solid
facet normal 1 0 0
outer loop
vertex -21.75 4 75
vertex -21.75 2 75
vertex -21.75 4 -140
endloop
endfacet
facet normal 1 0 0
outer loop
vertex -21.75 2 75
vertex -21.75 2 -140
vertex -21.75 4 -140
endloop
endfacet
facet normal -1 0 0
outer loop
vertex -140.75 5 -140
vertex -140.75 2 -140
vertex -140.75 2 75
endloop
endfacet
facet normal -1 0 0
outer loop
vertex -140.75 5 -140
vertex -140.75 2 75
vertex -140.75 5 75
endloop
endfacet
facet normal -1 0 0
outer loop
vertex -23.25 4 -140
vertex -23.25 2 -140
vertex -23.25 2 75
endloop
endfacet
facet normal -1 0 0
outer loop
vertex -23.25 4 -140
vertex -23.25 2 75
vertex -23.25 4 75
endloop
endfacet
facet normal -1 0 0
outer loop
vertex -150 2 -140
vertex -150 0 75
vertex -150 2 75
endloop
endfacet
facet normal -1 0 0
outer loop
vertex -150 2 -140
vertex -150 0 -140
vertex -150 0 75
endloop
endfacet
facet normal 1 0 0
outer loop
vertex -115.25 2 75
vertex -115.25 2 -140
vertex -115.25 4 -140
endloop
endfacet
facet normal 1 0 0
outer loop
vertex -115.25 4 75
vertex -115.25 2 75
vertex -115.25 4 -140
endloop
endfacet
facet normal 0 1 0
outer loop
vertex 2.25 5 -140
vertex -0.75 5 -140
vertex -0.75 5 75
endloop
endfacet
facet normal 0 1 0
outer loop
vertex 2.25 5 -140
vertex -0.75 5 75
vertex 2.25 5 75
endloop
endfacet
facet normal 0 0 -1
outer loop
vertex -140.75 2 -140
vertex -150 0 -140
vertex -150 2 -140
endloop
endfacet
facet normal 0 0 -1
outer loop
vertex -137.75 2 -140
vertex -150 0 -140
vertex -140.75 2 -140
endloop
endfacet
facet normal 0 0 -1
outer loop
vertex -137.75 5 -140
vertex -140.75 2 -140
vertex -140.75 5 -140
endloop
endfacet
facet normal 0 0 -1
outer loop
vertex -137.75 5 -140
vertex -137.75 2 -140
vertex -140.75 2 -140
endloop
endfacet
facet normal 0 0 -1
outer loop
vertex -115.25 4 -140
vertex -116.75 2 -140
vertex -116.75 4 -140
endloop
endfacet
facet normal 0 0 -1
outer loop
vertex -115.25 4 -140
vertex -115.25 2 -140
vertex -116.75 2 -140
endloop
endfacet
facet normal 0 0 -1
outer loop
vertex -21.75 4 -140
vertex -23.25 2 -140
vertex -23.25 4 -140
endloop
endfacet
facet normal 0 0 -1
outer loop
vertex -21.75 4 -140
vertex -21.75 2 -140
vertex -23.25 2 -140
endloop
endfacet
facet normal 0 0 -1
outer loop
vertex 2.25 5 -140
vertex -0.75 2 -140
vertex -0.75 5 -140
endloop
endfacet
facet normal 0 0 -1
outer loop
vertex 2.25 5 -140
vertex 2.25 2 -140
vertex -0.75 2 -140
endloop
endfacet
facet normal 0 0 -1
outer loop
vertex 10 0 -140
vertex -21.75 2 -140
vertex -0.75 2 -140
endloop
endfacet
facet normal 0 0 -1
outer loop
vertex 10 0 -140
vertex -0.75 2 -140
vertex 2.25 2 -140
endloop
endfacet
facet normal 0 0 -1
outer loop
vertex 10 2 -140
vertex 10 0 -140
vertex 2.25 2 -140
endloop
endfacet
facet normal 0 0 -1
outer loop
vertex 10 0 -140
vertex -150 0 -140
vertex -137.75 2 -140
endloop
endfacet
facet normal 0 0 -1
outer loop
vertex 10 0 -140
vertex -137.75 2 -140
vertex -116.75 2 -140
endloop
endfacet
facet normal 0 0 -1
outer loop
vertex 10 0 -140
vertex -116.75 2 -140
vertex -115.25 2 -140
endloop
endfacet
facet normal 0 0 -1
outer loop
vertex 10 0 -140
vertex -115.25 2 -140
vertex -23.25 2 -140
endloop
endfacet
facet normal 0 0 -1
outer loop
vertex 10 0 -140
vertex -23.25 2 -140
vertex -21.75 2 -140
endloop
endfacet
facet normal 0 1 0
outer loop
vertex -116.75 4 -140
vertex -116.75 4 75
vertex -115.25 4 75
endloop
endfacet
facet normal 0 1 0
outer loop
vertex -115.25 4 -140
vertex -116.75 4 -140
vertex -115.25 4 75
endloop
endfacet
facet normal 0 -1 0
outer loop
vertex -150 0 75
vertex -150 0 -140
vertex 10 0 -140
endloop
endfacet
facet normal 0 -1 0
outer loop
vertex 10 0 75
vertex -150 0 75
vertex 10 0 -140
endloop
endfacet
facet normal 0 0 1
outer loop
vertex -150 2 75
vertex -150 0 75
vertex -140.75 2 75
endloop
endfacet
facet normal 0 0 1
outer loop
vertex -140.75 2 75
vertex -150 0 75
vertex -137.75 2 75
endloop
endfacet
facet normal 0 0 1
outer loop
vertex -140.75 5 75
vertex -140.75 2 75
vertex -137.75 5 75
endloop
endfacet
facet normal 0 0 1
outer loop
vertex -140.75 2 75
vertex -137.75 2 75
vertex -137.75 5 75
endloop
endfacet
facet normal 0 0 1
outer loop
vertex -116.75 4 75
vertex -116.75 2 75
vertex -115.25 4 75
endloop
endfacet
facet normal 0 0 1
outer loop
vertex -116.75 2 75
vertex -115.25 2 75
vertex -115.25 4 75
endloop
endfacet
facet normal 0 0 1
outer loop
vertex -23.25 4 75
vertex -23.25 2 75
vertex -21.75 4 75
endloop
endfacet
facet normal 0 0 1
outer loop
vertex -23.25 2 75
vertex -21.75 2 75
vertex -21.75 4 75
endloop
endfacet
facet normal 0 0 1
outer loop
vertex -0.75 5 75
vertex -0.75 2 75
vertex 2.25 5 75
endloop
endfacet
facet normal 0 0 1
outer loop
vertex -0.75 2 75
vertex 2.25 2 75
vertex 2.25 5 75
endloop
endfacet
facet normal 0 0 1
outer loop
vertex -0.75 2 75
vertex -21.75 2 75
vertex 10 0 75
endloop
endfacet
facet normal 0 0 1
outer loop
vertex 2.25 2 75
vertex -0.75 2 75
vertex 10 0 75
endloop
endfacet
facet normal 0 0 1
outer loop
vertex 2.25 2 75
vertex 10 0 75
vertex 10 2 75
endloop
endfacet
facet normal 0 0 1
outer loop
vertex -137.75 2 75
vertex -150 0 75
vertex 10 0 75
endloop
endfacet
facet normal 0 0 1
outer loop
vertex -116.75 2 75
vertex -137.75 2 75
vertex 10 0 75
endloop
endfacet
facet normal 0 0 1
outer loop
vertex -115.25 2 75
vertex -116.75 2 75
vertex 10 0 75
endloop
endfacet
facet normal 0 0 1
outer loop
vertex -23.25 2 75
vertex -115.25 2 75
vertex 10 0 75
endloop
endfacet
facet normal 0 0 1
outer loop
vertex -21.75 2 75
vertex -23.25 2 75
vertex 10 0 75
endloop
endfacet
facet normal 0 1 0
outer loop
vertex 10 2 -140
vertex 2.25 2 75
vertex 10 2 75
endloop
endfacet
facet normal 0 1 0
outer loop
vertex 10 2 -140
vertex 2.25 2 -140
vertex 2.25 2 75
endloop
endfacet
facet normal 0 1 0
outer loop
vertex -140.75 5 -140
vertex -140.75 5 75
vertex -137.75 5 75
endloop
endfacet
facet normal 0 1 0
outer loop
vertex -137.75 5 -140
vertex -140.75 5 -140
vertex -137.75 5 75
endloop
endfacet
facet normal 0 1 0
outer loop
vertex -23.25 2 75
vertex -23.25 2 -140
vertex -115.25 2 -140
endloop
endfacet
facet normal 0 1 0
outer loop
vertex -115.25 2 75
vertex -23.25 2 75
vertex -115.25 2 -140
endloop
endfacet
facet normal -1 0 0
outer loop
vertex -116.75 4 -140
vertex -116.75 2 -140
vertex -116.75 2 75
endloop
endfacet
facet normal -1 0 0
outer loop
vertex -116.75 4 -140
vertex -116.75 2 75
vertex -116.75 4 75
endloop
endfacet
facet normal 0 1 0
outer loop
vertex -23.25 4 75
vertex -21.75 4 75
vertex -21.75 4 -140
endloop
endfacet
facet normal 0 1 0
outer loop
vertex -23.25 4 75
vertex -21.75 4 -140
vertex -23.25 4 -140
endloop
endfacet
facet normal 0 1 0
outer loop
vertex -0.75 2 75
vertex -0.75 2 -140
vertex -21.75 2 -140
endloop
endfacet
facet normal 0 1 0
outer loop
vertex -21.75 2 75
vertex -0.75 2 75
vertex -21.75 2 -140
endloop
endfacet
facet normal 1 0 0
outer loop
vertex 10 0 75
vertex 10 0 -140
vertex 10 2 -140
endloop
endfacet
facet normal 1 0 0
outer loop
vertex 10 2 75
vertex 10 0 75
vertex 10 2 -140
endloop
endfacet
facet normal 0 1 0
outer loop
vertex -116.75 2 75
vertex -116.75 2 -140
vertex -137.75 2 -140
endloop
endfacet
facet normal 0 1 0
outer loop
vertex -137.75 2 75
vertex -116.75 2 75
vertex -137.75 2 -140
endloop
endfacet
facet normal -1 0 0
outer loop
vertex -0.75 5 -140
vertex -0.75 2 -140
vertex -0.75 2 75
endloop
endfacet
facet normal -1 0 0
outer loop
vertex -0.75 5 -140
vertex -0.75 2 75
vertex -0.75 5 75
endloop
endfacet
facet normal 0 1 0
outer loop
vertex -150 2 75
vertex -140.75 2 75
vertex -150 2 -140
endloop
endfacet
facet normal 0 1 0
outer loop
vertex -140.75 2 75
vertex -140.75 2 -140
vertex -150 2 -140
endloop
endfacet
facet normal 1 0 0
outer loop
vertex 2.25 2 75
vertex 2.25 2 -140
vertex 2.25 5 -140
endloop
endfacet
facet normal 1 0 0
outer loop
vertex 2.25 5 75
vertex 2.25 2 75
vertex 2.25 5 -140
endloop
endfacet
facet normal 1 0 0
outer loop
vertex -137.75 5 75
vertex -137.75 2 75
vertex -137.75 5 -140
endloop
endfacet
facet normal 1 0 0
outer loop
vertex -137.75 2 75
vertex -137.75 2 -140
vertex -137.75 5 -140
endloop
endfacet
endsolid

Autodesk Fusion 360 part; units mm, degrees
sketch "Sketch1" plane through (0, 0, 0) normal (0, 1, 0) x (1, 0, 0)
  line L0 (0, 0) -> (-140, 0)
  line L1 (-140, 0) -> (-140, 140)
  line L2 (-140, 140) -> (0, 140)
  line L3 (0, 140) -> (0, 0)
  dimension "d1" = 140
  dimension "d2" = 140
extrude "Extrude1" add sketch "Sketch1" along normal blind 2 makes body 1
sketch "Sketch2" plane through (0, 2, 0) normal (0, 1, 0) x (-1, 0, 0)
  line L0 (0, -140) -> (140, -140)
  line L1 (140, -140) -> (140, 0)
  line L2 (140, 0) -> (0, 0)
  line L3 (0, 0) -> (0, -140)
  line L4 (70, -140) -> (23, -140)
  line L5 (117, -140) -> (116, -140)
  line L6 (117, -140) -> (117.75, -140)
  line L7 (117.75, -140) -> (116.25, -140)
  line L8 (117.75, -140) -> (116.25, -140)
  line L9 (116.25, -140) -> (116.25, 0)
  line L10 (116.25, 0) -> (117.75, 0)
  line L11 (117.75, 0) -> (117.75, -140)
  dimension "d5" = 47
  dimension "d6" = 47
  dimension "d7" = 0.75
  dimension "d8" = 1.5
extrude "Extrude2" add sketch "Sketch2" along normal blind 2 contours L0 L2 L5 L6 L7 L8 L9 L10 L11 bodies 1
sketch "Sketch3" plane through (0, 2, 0) normal (0, 1, 0) x (-1, 0, 0)
  line L0 (116.25, -140) -> (116.25, 0)
  line L1 (116.25, 0) -> (0, 0)
  line L2 (0, 0) -> (0, -140)
  line L3 (0, -140) -> (116.25, -140)
  line L4 (0, -140) -> (22.25, -140)
  line L5 (22.25, -140) -> (20.75, -140)
  line L6 (20.75, -140) -> (20.75, 0)
  line L7 (20.75, 0) -> (22.25, 0)
  line L8 (22.25, 0) -> (22.25, -140)
  dimension "d11" = 22.25
  dimension "d12" = 1.5
extrude "Extrude3" add sketch "Sketch3" along normal blind 2 contours L1 L3 L4 L5 L6 L7 L8 bodies 1
sketch "Sketch4" plane through (0, 2, 0) normal (0, 1, 0) x (-1, 0, 0)
extrude "Extrude4" add 1 faces at (0, 0.6667, -93.3333) along direction (1, 0, 0) blind 10 on bodies 1 bodies 1
extrude "Extrude5" add 1 faces at (-140, 0.6667, -46.6667) along direction (-1, 0, 0) blind 10 on bodies 1 bodies 1
sketch "Sketch5" plane through (0, 2, 0) normal (0, 1, 0) x (-1, 0, 0)
  line L0 (20.75, -140) -> (20.75, 0)
  line L1 (20.75, 0) -> (-10, 0)
  line L2 (-10, 0) -> (-10, -140)
  line L3 (-10, -140) -> (20.75, -140)
  line L4 (0.75, -140) -> (-2.25, -140)
  line L5 (-2.25, -140) -> (-2.25, 0)
  line L6 (-2.25, 0) -> (0.75, 0)
  line L7 (0.75, 0) -> (0.75, -140)
  dimension "d19" = 20
  dimension "d20" = 3
  dimension "d21" = 140
extrude "Extrude6" add sketch "Sketch5" along normal blind 3 contours L1 L3 L4 L5 L6 L7 bodies 1
sketch "Sketch6" plane through (0, 2, 0) normal (0, 1, 0) x (-1, 0, 0)
  line L0 (117.75, 0) -> (117.75, -140)
  line L1 (117.75, -140) -> (150, -140)
  line L2 (150, -140) -> (150, 0)
  line L3 (150, 0) -> (117.75, 0)
  line L4 (137.75, -140) -> (140.75, -140)
  line L5 (140.75, -140) -> (140.75, 0)
  line L6 (140.75, 0) -> (137.75, 0)
  line L7 (137.75, 0) -> (137.75, -140)
  dimension "d24" = 20
  dimension "d25" = 3
  dimension "d26" = 140
extrude "Extrude7" add sketch "Sketch6" along normal blind 3 contours L1 L3 L4 L5 L6 L7 bodies 1
sketch "Sketch7" plane through (0, 5, 0) normal (0, 1, 0) x (-1, 0, 0)
sketch "Sketch8" plane through (0, 2, 0) normal (0, 1, 0) x (-1, 0, 0)
sketch "Sketch9" plane through (0, 5, 0) normal (0, 1, 0) x (-1, 0, 0)
sketch "Sketch10" plane through (0, 5, 0) normal (0, 1, 0) x (-1, 0, 0)
sketch "Sketch11" plane through (0, 2, 0) normal (0, 1, 0) x (-1, 0, 0)
  line L0 (22.25, -140) -> (116.25, -140)
  line L1 (116.25, -140) -> (116.25, 0)
  line L2 (116.25, 0) -> (22.25, 0)
  line L3 (23.25, 0) -> (21.75, 0)
  line L4 (21.75, 0) -> (21.75, -140)
  line L5 (21.75, -140) -> (23.25, -140)
  line L6 (23.25, -140) -> (23.25, 0)
  dimension "d29" = 1
  dimension "d30" = 1.5
extrude "Extrude8" cut 1 faces at (-21.75, 4, -93.3333) along direction (0, -1, 0) blind 2 on bodies 1 bodies 1
extrude "Extrude9" add sketch "Sketch11" along normal blind 2 contours L0 L2 L3 L4 L5 L6 bodies 1
extrude "Extrude10" cut 1 faces at (-116.75, 4, -93.3333) along direction (0, -1, 0) blind 2 on bodies 1 bodies 1
sketch "Sketch12" plane through (0, 2, 0) normal (0, 1, 0) x (-1, 0, 0)
  line L0 (23.25, 0) -> (23.25, -140)
  line L1 (23.25, -140) -> (137.75, -140)
  line L2 (137.75, -140) -> (137.75, 0)
  line L3 (137.75, 0) -> (23.25, 0)
  line L4 (23.25, -140) -> (115.25, -140)
  line L5 (115.25, -140) -> (116.75, -140)
  line L6 (116.75, -140) -> (116.75, 0)
  line L7 (116.75, 0) -> (115.25, 0)
  line L8 (115.25, 0) -> (115.25, -140)
  dimension "d37" = 92
  dimension "d38" = 1.5
extrude "Extrude11" add sketch "Sketch12" along normal blind 2 contours L1 L3 L5 L6 L7 L8 bodies 1
sketch "Sketch13" plane through (0, 2, 0) normal (0, 1, 0) x (-1, 0, 0)
copy_body "Body->Comp1" bodies 1 removing the originals makes body 2 in component "Component"
extrude "Extrude1'" add 1 faces at (-92.5833, 0.6667, 0) along direction (0, 0, 1) blind 75 on bodies 2 bodies 2 in component "Component"
component "Component" placed x (1, 0, 0) y (0, 1, 0) z (0, 0, 1) at (0, 0, 0)
